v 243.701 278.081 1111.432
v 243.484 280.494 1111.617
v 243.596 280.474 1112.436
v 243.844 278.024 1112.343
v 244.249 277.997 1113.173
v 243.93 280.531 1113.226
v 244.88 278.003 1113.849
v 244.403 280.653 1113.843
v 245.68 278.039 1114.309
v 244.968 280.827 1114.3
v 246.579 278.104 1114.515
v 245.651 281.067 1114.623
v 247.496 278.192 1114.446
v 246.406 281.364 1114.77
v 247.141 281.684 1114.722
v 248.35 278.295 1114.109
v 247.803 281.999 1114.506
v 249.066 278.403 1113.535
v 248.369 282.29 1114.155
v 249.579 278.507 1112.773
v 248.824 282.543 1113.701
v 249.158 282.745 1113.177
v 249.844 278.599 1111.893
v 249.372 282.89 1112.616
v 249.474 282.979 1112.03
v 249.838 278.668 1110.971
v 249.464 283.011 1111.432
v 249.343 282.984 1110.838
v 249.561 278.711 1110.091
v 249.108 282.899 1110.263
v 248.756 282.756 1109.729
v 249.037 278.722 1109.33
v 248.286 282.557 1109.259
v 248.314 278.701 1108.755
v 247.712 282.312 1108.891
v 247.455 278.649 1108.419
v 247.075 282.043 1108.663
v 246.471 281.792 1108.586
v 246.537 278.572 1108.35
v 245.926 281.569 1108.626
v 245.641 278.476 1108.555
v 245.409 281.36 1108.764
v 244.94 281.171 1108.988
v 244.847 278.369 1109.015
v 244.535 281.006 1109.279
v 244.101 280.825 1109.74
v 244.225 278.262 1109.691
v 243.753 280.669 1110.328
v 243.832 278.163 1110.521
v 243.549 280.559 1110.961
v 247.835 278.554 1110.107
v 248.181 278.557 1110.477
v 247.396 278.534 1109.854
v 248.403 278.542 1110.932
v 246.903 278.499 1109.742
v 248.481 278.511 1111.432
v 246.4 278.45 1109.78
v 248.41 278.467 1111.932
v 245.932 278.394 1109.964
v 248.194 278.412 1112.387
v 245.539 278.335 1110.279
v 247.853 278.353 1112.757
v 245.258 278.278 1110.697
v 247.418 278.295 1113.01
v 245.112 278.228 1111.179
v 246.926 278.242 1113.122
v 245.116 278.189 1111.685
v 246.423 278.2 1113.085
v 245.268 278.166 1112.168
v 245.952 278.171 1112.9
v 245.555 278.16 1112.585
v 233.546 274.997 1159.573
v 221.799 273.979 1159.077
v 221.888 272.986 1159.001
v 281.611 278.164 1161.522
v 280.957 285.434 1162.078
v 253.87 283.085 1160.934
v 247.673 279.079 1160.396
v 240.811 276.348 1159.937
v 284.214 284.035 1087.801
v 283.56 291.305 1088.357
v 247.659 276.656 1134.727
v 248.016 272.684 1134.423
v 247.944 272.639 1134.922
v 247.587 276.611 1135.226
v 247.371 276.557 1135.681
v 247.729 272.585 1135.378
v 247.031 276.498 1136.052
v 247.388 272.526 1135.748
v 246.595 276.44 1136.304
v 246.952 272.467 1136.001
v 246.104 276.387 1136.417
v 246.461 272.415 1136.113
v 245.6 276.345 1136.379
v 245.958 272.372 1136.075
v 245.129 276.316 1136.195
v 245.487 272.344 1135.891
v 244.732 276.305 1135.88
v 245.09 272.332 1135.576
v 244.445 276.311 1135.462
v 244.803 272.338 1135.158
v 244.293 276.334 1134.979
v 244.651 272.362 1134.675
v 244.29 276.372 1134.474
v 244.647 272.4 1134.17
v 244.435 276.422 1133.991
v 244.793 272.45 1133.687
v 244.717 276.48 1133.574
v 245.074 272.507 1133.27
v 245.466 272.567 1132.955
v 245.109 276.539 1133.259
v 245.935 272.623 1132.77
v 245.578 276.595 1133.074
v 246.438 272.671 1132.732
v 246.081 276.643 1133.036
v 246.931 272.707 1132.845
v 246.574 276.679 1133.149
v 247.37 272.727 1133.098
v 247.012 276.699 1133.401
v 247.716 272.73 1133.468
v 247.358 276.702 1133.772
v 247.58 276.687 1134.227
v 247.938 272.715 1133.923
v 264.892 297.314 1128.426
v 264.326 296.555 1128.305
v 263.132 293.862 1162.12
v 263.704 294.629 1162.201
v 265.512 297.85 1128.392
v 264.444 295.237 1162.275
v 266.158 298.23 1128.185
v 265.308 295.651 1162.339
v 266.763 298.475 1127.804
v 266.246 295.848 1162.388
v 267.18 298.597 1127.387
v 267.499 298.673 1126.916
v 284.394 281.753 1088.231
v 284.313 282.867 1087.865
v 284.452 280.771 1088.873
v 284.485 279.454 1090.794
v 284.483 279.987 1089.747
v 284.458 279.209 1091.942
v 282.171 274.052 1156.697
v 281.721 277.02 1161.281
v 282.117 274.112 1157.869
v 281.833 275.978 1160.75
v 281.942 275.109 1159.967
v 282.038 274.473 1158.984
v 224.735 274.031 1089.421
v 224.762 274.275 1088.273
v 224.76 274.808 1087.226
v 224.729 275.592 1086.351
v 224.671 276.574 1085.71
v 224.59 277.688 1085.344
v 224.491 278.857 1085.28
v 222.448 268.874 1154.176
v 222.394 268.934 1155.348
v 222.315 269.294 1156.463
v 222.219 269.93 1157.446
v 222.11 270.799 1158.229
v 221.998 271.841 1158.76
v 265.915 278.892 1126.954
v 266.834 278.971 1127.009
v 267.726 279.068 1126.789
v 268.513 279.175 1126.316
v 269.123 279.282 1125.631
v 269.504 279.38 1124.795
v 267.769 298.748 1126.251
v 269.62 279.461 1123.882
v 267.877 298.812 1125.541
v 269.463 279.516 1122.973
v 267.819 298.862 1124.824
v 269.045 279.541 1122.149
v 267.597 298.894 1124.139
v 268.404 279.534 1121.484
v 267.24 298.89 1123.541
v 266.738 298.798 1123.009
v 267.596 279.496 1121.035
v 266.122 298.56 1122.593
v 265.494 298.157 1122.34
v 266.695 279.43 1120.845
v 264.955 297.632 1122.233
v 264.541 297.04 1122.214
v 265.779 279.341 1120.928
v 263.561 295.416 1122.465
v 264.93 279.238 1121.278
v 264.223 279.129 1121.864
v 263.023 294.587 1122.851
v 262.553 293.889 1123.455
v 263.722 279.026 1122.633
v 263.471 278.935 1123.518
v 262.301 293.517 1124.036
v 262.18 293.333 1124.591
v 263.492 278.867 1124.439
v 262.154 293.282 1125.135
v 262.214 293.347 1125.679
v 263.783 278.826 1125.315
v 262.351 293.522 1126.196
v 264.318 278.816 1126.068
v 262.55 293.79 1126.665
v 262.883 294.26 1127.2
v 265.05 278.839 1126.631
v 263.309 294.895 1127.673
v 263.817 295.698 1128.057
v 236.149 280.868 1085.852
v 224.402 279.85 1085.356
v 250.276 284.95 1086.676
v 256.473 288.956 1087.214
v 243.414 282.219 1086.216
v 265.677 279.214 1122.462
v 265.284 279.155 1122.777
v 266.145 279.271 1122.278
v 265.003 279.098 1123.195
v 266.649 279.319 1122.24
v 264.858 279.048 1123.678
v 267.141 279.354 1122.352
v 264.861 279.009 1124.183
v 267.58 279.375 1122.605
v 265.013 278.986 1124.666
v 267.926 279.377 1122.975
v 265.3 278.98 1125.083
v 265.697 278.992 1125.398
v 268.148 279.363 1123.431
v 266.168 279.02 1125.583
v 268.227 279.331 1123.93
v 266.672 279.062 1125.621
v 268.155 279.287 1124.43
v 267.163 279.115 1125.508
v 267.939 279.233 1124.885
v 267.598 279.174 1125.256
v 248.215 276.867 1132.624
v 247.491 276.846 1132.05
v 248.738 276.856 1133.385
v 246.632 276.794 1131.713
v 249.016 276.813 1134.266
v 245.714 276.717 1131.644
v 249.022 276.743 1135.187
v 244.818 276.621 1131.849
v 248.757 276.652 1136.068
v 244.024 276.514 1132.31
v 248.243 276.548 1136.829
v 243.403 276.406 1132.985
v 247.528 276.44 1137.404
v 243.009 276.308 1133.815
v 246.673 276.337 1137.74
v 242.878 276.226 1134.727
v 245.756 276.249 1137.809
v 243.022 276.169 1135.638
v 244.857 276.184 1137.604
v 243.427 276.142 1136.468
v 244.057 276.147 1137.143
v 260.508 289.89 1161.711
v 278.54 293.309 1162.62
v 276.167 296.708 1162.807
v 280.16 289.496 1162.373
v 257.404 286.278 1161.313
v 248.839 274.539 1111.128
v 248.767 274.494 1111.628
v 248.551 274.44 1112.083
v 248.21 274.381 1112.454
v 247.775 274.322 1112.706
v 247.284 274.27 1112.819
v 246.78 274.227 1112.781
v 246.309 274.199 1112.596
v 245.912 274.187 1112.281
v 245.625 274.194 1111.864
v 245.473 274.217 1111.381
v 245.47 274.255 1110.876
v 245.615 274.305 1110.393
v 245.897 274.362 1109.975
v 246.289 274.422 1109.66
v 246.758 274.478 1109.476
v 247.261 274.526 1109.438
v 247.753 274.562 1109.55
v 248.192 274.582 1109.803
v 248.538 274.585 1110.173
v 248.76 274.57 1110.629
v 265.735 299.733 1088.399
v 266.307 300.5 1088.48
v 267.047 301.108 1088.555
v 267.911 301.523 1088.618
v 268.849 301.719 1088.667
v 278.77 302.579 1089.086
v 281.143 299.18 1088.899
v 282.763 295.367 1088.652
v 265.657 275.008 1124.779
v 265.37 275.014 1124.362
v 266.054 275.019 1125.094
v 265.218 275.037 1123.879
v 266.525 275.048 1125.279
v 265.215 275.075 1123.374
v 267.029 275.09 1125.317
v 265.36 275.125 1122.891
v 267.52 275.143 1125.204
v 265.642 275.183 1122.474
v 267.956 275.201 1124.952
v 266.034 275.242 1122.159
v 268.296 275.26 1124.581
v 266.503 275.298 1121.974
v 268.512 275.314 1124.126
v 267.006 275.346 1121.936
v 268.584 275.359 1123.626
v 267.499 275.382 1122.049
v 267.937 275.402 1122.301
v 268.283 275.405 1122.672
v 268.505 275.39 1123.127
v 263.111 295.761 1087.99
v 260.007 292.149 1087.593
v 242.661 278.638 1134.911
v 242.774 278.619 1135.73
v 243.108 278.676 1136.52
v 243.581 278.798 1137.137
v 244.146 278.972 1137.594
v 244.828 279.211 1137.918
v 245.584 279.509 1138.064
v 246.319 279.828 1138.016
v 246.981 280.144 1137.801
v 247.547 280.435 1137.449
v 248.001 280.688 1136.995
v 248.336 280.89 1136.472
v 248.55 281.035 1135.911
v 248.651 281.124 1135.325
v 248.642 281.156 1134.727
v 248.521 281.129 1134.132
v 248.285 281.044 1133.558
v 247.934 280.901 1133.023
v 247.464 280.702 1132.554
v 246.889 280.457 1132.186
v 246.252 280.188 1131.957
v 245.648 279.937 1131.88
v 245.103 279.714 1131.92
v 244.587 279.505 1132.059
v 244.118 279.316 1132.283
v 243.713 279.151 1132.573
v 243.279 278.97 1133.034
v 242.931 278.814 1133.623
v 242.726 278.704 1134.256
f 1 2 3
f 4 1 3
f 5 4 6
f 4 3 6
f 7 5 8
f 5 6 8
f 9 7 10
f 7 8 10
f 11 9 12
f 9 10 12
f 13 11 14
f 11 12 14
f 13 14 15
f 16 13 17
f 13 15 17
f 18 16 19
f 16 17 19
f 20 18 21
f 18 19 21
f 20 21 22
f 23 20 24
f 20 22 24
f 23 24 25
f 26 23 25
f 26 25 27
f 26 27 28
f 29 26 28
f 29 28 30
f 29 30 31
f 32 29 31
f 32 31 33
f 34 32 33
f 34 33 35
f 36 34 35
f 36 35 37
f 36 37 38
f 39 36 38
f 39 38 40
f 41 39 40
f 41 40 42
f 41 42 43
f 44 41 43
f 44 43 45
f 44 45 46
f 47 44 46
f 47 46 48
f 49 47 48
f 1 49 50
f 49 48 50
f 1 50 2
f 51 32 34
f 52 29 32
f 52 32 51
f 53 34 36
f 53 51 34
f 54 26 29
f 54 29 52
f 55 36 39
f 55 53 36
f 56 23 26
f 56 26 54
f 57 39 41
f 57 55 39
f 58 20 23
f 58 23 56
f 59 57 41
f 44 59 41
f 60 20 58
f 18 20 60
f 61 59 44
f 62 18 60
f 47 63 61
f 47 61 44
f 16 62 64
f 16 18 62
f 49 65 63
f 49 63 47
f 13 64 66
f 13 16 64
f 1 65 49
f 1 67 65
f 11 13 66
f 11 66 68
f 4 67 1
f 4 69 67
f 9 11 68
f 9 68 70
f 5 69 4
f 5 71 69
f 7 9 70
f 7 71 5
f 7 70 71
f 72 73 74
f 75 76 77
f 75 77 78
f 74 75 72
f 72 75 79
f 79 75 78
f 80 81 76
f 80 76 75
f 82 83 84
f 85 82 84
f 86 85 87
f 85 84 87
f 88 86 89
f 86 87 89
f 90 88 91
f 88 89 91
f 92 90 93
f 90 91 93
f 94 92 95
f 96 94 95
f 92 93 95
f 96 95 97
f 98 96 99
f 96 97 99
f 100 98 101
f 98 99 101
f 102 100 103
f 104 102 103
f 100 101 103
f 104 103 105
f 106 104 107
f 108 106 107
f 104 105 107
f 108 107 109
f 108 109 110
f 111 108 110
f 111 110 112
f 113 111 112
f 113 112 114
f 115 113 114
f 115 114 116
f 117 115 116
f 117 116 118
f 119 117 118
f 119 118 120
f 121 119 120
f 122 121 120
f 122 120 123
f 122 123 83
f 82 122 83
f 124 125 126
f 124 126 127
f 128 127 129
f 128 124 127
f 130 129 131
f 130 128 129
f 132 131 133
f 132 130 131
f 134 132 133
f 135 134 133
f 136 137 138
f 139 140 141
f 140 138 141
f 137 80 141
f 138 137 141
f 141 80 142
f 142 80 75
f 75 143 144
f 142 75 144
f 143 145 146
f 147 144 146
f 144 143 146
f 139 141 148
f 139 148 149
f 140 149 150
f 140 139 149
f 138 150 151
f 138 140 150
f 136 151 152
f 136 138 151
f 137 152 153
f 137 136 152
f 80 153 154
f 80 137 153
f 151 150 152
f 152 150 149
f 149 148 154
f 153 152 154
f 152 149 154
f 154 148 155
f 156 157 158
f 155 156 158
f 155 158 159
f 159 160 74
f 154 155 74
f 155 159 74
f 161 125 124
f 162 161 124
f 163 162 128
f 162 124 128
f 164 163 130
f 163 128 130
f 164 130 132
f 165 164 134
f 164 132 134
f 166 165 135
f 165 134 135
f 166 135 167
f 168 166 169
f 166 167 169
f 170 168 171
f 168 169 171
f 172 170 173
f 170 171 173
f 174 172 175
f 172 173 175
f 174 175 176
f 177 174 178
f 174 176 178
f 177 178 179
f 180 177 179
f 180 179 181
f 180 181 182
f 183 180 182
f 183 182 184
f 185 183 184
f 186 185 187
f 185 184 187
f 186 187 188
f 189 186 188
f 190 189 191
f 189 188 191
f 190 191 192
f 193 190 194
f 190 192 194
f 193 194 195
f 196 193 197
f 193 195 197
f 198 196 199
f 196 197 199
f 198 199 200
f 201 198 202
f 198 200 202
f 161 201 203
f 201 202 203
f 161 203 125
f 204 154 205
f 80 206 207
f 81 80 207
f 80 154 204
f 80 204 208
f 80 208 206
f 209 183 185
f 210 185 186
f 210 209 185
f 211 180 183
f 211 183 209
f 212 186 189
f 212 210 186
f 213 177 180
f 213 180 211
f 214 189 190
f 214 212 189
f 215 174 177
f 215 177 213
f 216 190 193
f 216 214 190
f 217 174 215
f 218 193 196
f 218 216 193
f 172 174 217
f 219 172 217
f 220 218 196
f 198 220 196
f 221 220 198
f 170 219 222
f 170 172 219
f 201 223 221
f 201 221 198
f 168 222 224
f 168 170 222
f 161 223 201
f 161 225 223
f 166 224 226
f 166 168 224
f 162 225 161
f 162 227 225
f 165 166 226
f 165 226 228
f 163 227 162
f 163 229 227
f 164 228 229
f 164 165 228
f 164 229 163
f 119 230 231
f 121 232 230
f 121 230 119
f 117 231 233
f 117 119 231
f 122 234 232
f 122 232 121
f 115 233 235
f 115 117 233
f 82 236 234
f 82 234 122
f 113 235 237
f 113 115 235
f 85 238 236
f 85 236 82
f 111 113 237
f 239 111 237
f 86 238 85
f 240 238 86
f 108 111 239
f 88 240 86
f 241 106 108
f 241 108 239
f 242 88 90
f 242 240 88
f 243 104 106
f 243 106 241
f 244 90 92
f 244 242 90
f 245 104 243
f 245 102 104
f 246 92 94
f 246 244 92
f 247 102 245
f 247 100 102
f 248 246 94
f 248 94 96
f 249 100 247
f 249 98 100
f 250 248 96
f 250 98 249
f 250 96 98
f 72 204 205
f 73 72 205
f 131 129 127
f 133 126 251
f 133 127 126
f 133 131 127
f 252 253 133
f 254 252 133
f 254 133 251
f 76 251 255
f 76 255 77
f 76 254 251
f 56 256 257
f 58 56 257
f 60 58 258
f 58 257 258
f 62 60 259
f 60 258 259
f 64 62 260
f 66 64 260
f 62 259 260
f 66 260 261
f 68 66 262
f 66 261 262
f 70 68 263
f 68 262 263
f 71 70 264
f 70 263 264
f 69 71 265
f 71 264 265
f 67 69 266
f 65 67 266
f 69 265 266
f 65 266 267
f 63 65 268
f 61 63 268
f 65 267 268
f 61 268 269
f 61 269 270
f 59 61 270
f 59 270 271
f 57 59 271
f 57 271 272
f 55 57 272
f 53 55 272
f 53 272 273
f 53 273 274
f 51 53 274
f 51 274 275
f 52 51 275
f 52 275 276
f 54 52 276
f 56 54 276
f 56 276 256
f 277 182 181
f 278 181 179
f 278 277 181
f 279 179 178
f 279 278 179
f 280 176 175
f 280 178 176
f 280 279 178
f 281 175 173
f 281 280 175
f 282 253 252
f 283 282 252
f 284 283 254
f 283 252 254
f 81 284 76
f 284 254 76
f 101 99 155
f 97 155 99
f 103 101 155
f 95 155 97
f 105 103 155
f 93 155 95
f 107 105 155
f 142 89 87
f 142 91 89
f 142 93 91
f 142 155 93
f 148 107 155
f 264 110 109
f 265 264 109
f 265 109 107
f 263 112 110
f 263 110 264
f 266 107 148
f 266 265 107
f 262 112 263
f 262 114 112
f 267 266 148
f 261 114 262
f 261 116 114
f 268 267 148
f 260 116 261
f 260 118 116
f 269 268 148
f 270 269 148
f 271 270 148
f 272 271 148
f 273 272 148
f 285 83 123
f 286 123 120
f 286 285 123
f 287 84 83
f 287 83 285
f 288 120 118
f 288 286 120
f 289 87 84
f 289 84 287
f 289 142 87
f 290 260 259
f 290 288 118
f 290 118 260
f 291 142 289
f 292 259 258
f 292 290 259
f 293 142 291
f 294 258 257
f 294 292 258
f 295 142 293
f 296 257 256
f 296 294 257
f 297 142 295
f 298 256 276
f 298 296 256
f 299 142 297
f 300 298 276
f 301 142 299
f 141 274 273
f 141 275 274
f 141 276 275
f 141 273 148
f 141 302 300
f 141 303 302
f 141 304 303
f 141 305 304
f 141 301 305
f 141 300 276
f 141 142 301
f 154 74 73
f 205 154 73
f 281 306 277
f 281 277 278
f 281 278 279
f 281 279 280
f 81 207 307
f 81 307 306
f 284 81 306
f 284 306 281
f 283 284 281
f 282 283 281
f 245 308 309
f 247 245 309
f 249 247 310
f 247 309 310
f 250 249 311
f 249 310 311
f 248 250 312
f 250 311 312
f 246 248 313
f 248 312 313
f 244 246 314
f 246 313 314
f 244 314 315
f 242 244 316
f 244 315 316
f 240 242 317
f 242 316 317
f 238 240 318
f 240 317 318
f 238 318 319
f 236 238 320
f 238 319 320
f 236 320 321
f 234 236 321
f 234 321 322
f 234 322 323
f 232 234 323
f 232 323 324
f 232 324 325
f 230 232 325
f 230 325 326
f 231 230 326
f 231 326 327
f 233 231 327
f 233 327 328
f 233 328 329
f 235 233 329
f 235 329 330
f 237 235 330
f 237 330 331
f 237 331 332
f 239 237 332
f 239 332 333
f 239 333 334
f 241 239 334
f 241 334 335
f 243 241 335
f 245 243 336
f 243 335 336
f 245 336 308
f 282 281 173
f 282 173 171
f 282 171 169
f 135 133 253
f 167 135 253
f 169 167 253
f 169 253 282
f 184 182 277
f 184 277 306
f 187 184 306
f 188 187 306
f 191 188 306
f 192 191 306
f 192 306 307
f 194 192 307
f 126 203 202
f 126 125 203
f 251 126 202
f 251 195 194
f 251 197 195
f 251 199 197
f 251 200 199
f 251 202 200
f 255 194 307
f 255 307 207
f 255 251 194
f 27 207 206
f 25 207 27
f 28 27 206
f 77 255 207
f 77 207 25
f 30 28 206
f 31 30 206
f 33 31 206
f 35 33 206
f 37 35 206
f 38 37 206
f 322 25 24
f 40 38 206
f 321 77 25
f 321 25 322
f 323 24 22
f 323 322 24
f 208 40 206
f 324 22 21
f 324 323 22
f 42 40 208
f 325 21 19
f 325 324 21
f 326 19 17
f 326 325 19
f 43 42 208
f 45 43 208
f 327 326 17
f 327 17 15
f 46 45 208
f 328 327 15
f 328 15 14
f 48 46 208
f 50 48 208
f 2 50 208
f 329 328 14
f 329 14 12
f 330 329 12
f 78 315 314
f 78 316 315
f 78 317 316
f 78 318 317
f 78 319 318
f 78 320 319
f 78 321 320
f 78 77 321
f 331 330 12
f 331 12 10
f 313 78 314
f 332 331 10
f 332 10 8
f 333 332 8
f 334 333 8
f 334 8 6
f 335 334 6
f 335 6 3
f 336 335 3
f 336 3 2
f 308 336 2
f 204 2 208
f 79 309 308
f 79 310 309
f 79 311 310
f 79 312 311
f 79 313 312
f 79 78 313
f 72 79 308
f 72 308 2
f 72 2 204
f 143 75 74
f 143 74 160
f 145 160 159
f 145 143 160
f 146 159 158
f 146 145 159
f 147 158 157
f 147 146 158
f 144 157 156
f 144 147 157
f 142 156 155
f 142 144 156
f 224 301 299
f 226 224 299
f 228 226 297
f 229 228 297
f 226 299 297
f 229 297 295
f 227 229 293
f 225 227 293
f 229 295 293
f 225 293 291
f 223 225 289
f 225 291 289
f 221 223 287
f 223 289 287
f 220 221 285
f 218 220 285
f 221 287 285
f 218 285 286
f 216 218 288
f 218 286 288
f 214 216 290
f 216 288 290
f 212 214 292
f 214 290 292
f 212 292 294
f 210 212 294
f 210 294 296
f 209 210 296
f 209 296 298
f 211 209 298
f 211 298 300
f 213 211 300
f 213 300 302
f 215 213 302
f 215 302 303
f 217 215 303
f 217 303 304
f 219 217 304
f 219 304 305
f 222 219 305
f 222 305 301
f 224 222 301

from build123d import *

# Parameters (mm, degrees)
EXTRUDE_1_DEPTH     = 75
CUT_EXTRUDE_2_DEPTH = 89
CUT_EXTRUDE_3_DEPTH = 89
CUT_EXTRUDE_4_DEPTH = 102
FILLET_1_R          = 4
SKETCH_8_R          = 1.7
CUT_EXTRUDE_5_DEPTH = 27
SKETCH_9_R          = 3.1
CUT_EXTRUDE_6_DEPTH = 19.5


with BuildPart() as part:
    # 草图1 → 凸台-拉伸1 (new body)
    with BuildSketch(Plane(origin=(-39.59611161, -89.310119263, 1121.416485544), x_dir=(-0.9993811405079087, 0.0027925735986707154, -0.035064761938558196), z_dir=(0.03517578708588839, 0.07933995566829549, -0.9962267991965691))):
        with BuildLine():
            Line((-262.075571521, 359.155993571), (-261.628696205, 364.135983777))
            Line((-261.628696205, 364.135983777), (-261.435860549, 366.284949367))
            ThreePointArc((-261.435860549, 366.284949367), (-261.109064157, 368.074809297), (-260.463371375, 369.775831132))
            Line((-260.463371375, 369.775831132), (-248.776723549, 393.730780012))
            ThreePointArc((-248.776723549, 393.730780012), (-256.744007891, 423.508755886), (-287.342992795, 419.779467775))
            Line((-287.342992795, 419.779467775), (-315.661768776, 388.401500241))
            ThreePointArc((-315.661768776, 388.401500241), (-319.142063417, 383.007701172), (-320.734355269, 376.78917033))
            Line((-320.734355269, 376.78917033), (-321.388578677, 369.498487569))
            Line((-321.388578677, 369.498487569), (-321.835453993, 364.518497363))
            Line((-321.835453993, 364.518497363), (-262.075571521, 359.155993571))
        make_face()
    extrude(amount=EXTRUDE_1_DEPTH)

    # 草图2 → 切除-拉伸2 (cut)
    with BuildSketch(Plane(origin=(351.495487401, 30.478889762, 14.83831212), x_dir=(0.04186275100976059, 0.0036300044207880334, -0.999116776531052), z_dir=(0.995381658359661, 0.08631157133879107, 0.04201983881692256))):
        with BuildLine():
            Line((-1054.940506582, 279.262299259), (-1060.282877118, 349.349088516))
            Line((-1060.282877118, 349.349088516), (-1174.950235928, 340.60856087))
            Line((-1174.950235928, 340.60856087), (-1169.607865392, 270.521771613))
            Line((-1169.607865392, 270.521771613), (-1168.694349481, 258.537317011))
            Line((-1168.694349481, 258.537317011), (-1168.137997642, 251.238513271))
            ThreePointArc((-1168.137997642, 251.238513271), (-1159.493263254, 234.16850768), (-1141.310196239, 228.210941279))
            Line((-1141.310196239, 228.210941279), (-1076.498210824, 233.151239514))
            ThreePointArc((-1076.498210824, 233.151239514), (-1059.428205233, 241.795973902), (-1053.470638832, 259.979040917))
            Line((-1053.470638832, 259.979040917), (-1054.026990671, 267.277844657))
            Line((-1054.026990671, 267.277844657), (-1054.940506582, 279.262299259))
        make_face()
        with BuildLine():
            Line((-1075.381209674, 277.7042052), (-1079.165486151, 327.350291365))
            Line((-1079.165486151, 327.350291365), (-1152.951438777, 321.725951836))
            Line((-1152.951438777, 321.725951836), (-1149.1671623, 272.079865671))
            Line((-1149.1671623, 272.079865671), (-1148.253646388, 260.095411069))
            Line((-1148.253646388, 260.095411069), (-1147.69729455, 252.79660733))
            ThreePointArc((-1147.69729455, 252.79660733), (-1146.14124236, 249.724006324), (-1142.868290297, 248.651644371))
            Line((-1142.868290297, 248.651644371), (-1078.056304883, 253.591942606))
            ThreePointArc((-1078.056304883, 253.591942606), (-1074.983703877, 255.147994796), (-1073.911341925, 258.420946859))
            Line((-1073.911341925, 258.420946859), (-1074.467693763, 265.719750598))
            Line((-1074.467693763, 265.719750598), (-1075.381209674, 277.7042052))
        make_face(mode=Mode.SUBTRACT)
    extrude(amount=-CUT_EXTRUDE_2_DEPTH, mode=Mode.SUBTRACT)

    # 草图4 → 切除-拉伸3 (cut)
    with BuildSketch(Plane(origin=(-39.578523717, -89.270449285, 1120.918372145), x_dir=(0.9993811405079086, -0.002792573598663483, 0.03506476193856097), z_dir=(-0.03517578708589058, -0.0793399556682715, 0.9962267991965709))):
        with BuildLine():
            Line((273.293580359, 366.186740579), (261.539321142, 365.131981818))
            Line((261.539321142, 365.131981818), (235.445654793, 362.790488178))
            Line((235.445654793, 362.790488178), (232.049402391, 400.638413743))
            ThreePointArc((232.049402391, 400.638413743), (294.258339674, 433.19870407), (273.293580359, 366.186740579))
        make_face()
    extrude(amount=-CUT_EXTRUDE_3_DEPTH, mode=Mode.SUBTRACT)

    # 草图7 → 切除-拉伸4 (cut)
    with BuildSketch(Plane(origin=(-39.578523717, -89.270449285, 1120.918372145), x_dir=(0.9993811405079086, -0.002792573598663483, 0.03506476193856097), z_dir=(-0.03517578708589058, -0.0793399556682715, 0.996226799196571))):
        Polygon((303.866510818, 387.002501991), (315.940576228, 388.085958298), (314.335988901, 405.967521421), (302.261923491, 404.884065114), align=None)
    extrude(amount=-CUT_EXTRUDE_4_DEPTH, mode=Mode.SUBTRACT)

    # 圆角1
    fillet_1_edges = [part.edges().sort_by_distance(p)[0] for p in [
        (265.401440549, 298.597567558, 1125.436762489),
    ]]
    fillet(fillet_1_edges, radius=FILLET_1_R)

    # 草图8 → 切除-拉伸5 (cut)
    with BuildSketch(Plane(origin=(-29.90386421, 332.486882621, 25.423530653), x_dir=(0.9960030029050818, 0.0890597720529966, 0.0068099343556353885), z_dir=(0.08931975259739458, -0.9931039643902253, -0.07593745919082608))):
        with Locations(Location((277.335448654, 1110.342499925, 0), (0, 0, 359.608686584))):
            Circle(SKETCH_8_R)
        with Locations(Location((297.985718495, 1099.373618692, 0), (0, 0, 359.608686584))):
            Circle(SKETCH_8_R)
        with Locations(Location((278.161253776, 1086.974401032, 0), (0, 0, 359.608686584))):
            Circle(SKETCH_8_R)
    extrude(amount=-CUT_EXTRUDE_5_DEPTH, mode=Mode.SUBTRACT)

    # 草图9 → 切除-拉伸6 (cut)
    with BuildSketch(Plane(origin=(-32.002878396, 355.824825784, 27.208060944), x_dir=(0.9960030029050824, 0.08905977205298932, 0.006809934355638229), z_dir=(-0.08931975259738754, 0.9931039643902232, 0.07593745919086373))):
        with Locations(Location((278.161253776, -1086.974401032, 0), (0, 0, 180.391313416))):
            Circle(SKETCH_9_R)
        with Locations(Location((297.985718495, -1099.373618692, 0), (0, 0, 258.436796429))):
            Circle(SKETCH_9_R)
        with Locations(Location((277.335448654, -1110.342499925, 0), (0, 0, 180.391313416))):
            Circle(SKETCH_9_R)
    extrude(amount=-CUT_EXTRUDE_6_DEPTH, mode=Mode.SUBTRACT)


solid = part.part
